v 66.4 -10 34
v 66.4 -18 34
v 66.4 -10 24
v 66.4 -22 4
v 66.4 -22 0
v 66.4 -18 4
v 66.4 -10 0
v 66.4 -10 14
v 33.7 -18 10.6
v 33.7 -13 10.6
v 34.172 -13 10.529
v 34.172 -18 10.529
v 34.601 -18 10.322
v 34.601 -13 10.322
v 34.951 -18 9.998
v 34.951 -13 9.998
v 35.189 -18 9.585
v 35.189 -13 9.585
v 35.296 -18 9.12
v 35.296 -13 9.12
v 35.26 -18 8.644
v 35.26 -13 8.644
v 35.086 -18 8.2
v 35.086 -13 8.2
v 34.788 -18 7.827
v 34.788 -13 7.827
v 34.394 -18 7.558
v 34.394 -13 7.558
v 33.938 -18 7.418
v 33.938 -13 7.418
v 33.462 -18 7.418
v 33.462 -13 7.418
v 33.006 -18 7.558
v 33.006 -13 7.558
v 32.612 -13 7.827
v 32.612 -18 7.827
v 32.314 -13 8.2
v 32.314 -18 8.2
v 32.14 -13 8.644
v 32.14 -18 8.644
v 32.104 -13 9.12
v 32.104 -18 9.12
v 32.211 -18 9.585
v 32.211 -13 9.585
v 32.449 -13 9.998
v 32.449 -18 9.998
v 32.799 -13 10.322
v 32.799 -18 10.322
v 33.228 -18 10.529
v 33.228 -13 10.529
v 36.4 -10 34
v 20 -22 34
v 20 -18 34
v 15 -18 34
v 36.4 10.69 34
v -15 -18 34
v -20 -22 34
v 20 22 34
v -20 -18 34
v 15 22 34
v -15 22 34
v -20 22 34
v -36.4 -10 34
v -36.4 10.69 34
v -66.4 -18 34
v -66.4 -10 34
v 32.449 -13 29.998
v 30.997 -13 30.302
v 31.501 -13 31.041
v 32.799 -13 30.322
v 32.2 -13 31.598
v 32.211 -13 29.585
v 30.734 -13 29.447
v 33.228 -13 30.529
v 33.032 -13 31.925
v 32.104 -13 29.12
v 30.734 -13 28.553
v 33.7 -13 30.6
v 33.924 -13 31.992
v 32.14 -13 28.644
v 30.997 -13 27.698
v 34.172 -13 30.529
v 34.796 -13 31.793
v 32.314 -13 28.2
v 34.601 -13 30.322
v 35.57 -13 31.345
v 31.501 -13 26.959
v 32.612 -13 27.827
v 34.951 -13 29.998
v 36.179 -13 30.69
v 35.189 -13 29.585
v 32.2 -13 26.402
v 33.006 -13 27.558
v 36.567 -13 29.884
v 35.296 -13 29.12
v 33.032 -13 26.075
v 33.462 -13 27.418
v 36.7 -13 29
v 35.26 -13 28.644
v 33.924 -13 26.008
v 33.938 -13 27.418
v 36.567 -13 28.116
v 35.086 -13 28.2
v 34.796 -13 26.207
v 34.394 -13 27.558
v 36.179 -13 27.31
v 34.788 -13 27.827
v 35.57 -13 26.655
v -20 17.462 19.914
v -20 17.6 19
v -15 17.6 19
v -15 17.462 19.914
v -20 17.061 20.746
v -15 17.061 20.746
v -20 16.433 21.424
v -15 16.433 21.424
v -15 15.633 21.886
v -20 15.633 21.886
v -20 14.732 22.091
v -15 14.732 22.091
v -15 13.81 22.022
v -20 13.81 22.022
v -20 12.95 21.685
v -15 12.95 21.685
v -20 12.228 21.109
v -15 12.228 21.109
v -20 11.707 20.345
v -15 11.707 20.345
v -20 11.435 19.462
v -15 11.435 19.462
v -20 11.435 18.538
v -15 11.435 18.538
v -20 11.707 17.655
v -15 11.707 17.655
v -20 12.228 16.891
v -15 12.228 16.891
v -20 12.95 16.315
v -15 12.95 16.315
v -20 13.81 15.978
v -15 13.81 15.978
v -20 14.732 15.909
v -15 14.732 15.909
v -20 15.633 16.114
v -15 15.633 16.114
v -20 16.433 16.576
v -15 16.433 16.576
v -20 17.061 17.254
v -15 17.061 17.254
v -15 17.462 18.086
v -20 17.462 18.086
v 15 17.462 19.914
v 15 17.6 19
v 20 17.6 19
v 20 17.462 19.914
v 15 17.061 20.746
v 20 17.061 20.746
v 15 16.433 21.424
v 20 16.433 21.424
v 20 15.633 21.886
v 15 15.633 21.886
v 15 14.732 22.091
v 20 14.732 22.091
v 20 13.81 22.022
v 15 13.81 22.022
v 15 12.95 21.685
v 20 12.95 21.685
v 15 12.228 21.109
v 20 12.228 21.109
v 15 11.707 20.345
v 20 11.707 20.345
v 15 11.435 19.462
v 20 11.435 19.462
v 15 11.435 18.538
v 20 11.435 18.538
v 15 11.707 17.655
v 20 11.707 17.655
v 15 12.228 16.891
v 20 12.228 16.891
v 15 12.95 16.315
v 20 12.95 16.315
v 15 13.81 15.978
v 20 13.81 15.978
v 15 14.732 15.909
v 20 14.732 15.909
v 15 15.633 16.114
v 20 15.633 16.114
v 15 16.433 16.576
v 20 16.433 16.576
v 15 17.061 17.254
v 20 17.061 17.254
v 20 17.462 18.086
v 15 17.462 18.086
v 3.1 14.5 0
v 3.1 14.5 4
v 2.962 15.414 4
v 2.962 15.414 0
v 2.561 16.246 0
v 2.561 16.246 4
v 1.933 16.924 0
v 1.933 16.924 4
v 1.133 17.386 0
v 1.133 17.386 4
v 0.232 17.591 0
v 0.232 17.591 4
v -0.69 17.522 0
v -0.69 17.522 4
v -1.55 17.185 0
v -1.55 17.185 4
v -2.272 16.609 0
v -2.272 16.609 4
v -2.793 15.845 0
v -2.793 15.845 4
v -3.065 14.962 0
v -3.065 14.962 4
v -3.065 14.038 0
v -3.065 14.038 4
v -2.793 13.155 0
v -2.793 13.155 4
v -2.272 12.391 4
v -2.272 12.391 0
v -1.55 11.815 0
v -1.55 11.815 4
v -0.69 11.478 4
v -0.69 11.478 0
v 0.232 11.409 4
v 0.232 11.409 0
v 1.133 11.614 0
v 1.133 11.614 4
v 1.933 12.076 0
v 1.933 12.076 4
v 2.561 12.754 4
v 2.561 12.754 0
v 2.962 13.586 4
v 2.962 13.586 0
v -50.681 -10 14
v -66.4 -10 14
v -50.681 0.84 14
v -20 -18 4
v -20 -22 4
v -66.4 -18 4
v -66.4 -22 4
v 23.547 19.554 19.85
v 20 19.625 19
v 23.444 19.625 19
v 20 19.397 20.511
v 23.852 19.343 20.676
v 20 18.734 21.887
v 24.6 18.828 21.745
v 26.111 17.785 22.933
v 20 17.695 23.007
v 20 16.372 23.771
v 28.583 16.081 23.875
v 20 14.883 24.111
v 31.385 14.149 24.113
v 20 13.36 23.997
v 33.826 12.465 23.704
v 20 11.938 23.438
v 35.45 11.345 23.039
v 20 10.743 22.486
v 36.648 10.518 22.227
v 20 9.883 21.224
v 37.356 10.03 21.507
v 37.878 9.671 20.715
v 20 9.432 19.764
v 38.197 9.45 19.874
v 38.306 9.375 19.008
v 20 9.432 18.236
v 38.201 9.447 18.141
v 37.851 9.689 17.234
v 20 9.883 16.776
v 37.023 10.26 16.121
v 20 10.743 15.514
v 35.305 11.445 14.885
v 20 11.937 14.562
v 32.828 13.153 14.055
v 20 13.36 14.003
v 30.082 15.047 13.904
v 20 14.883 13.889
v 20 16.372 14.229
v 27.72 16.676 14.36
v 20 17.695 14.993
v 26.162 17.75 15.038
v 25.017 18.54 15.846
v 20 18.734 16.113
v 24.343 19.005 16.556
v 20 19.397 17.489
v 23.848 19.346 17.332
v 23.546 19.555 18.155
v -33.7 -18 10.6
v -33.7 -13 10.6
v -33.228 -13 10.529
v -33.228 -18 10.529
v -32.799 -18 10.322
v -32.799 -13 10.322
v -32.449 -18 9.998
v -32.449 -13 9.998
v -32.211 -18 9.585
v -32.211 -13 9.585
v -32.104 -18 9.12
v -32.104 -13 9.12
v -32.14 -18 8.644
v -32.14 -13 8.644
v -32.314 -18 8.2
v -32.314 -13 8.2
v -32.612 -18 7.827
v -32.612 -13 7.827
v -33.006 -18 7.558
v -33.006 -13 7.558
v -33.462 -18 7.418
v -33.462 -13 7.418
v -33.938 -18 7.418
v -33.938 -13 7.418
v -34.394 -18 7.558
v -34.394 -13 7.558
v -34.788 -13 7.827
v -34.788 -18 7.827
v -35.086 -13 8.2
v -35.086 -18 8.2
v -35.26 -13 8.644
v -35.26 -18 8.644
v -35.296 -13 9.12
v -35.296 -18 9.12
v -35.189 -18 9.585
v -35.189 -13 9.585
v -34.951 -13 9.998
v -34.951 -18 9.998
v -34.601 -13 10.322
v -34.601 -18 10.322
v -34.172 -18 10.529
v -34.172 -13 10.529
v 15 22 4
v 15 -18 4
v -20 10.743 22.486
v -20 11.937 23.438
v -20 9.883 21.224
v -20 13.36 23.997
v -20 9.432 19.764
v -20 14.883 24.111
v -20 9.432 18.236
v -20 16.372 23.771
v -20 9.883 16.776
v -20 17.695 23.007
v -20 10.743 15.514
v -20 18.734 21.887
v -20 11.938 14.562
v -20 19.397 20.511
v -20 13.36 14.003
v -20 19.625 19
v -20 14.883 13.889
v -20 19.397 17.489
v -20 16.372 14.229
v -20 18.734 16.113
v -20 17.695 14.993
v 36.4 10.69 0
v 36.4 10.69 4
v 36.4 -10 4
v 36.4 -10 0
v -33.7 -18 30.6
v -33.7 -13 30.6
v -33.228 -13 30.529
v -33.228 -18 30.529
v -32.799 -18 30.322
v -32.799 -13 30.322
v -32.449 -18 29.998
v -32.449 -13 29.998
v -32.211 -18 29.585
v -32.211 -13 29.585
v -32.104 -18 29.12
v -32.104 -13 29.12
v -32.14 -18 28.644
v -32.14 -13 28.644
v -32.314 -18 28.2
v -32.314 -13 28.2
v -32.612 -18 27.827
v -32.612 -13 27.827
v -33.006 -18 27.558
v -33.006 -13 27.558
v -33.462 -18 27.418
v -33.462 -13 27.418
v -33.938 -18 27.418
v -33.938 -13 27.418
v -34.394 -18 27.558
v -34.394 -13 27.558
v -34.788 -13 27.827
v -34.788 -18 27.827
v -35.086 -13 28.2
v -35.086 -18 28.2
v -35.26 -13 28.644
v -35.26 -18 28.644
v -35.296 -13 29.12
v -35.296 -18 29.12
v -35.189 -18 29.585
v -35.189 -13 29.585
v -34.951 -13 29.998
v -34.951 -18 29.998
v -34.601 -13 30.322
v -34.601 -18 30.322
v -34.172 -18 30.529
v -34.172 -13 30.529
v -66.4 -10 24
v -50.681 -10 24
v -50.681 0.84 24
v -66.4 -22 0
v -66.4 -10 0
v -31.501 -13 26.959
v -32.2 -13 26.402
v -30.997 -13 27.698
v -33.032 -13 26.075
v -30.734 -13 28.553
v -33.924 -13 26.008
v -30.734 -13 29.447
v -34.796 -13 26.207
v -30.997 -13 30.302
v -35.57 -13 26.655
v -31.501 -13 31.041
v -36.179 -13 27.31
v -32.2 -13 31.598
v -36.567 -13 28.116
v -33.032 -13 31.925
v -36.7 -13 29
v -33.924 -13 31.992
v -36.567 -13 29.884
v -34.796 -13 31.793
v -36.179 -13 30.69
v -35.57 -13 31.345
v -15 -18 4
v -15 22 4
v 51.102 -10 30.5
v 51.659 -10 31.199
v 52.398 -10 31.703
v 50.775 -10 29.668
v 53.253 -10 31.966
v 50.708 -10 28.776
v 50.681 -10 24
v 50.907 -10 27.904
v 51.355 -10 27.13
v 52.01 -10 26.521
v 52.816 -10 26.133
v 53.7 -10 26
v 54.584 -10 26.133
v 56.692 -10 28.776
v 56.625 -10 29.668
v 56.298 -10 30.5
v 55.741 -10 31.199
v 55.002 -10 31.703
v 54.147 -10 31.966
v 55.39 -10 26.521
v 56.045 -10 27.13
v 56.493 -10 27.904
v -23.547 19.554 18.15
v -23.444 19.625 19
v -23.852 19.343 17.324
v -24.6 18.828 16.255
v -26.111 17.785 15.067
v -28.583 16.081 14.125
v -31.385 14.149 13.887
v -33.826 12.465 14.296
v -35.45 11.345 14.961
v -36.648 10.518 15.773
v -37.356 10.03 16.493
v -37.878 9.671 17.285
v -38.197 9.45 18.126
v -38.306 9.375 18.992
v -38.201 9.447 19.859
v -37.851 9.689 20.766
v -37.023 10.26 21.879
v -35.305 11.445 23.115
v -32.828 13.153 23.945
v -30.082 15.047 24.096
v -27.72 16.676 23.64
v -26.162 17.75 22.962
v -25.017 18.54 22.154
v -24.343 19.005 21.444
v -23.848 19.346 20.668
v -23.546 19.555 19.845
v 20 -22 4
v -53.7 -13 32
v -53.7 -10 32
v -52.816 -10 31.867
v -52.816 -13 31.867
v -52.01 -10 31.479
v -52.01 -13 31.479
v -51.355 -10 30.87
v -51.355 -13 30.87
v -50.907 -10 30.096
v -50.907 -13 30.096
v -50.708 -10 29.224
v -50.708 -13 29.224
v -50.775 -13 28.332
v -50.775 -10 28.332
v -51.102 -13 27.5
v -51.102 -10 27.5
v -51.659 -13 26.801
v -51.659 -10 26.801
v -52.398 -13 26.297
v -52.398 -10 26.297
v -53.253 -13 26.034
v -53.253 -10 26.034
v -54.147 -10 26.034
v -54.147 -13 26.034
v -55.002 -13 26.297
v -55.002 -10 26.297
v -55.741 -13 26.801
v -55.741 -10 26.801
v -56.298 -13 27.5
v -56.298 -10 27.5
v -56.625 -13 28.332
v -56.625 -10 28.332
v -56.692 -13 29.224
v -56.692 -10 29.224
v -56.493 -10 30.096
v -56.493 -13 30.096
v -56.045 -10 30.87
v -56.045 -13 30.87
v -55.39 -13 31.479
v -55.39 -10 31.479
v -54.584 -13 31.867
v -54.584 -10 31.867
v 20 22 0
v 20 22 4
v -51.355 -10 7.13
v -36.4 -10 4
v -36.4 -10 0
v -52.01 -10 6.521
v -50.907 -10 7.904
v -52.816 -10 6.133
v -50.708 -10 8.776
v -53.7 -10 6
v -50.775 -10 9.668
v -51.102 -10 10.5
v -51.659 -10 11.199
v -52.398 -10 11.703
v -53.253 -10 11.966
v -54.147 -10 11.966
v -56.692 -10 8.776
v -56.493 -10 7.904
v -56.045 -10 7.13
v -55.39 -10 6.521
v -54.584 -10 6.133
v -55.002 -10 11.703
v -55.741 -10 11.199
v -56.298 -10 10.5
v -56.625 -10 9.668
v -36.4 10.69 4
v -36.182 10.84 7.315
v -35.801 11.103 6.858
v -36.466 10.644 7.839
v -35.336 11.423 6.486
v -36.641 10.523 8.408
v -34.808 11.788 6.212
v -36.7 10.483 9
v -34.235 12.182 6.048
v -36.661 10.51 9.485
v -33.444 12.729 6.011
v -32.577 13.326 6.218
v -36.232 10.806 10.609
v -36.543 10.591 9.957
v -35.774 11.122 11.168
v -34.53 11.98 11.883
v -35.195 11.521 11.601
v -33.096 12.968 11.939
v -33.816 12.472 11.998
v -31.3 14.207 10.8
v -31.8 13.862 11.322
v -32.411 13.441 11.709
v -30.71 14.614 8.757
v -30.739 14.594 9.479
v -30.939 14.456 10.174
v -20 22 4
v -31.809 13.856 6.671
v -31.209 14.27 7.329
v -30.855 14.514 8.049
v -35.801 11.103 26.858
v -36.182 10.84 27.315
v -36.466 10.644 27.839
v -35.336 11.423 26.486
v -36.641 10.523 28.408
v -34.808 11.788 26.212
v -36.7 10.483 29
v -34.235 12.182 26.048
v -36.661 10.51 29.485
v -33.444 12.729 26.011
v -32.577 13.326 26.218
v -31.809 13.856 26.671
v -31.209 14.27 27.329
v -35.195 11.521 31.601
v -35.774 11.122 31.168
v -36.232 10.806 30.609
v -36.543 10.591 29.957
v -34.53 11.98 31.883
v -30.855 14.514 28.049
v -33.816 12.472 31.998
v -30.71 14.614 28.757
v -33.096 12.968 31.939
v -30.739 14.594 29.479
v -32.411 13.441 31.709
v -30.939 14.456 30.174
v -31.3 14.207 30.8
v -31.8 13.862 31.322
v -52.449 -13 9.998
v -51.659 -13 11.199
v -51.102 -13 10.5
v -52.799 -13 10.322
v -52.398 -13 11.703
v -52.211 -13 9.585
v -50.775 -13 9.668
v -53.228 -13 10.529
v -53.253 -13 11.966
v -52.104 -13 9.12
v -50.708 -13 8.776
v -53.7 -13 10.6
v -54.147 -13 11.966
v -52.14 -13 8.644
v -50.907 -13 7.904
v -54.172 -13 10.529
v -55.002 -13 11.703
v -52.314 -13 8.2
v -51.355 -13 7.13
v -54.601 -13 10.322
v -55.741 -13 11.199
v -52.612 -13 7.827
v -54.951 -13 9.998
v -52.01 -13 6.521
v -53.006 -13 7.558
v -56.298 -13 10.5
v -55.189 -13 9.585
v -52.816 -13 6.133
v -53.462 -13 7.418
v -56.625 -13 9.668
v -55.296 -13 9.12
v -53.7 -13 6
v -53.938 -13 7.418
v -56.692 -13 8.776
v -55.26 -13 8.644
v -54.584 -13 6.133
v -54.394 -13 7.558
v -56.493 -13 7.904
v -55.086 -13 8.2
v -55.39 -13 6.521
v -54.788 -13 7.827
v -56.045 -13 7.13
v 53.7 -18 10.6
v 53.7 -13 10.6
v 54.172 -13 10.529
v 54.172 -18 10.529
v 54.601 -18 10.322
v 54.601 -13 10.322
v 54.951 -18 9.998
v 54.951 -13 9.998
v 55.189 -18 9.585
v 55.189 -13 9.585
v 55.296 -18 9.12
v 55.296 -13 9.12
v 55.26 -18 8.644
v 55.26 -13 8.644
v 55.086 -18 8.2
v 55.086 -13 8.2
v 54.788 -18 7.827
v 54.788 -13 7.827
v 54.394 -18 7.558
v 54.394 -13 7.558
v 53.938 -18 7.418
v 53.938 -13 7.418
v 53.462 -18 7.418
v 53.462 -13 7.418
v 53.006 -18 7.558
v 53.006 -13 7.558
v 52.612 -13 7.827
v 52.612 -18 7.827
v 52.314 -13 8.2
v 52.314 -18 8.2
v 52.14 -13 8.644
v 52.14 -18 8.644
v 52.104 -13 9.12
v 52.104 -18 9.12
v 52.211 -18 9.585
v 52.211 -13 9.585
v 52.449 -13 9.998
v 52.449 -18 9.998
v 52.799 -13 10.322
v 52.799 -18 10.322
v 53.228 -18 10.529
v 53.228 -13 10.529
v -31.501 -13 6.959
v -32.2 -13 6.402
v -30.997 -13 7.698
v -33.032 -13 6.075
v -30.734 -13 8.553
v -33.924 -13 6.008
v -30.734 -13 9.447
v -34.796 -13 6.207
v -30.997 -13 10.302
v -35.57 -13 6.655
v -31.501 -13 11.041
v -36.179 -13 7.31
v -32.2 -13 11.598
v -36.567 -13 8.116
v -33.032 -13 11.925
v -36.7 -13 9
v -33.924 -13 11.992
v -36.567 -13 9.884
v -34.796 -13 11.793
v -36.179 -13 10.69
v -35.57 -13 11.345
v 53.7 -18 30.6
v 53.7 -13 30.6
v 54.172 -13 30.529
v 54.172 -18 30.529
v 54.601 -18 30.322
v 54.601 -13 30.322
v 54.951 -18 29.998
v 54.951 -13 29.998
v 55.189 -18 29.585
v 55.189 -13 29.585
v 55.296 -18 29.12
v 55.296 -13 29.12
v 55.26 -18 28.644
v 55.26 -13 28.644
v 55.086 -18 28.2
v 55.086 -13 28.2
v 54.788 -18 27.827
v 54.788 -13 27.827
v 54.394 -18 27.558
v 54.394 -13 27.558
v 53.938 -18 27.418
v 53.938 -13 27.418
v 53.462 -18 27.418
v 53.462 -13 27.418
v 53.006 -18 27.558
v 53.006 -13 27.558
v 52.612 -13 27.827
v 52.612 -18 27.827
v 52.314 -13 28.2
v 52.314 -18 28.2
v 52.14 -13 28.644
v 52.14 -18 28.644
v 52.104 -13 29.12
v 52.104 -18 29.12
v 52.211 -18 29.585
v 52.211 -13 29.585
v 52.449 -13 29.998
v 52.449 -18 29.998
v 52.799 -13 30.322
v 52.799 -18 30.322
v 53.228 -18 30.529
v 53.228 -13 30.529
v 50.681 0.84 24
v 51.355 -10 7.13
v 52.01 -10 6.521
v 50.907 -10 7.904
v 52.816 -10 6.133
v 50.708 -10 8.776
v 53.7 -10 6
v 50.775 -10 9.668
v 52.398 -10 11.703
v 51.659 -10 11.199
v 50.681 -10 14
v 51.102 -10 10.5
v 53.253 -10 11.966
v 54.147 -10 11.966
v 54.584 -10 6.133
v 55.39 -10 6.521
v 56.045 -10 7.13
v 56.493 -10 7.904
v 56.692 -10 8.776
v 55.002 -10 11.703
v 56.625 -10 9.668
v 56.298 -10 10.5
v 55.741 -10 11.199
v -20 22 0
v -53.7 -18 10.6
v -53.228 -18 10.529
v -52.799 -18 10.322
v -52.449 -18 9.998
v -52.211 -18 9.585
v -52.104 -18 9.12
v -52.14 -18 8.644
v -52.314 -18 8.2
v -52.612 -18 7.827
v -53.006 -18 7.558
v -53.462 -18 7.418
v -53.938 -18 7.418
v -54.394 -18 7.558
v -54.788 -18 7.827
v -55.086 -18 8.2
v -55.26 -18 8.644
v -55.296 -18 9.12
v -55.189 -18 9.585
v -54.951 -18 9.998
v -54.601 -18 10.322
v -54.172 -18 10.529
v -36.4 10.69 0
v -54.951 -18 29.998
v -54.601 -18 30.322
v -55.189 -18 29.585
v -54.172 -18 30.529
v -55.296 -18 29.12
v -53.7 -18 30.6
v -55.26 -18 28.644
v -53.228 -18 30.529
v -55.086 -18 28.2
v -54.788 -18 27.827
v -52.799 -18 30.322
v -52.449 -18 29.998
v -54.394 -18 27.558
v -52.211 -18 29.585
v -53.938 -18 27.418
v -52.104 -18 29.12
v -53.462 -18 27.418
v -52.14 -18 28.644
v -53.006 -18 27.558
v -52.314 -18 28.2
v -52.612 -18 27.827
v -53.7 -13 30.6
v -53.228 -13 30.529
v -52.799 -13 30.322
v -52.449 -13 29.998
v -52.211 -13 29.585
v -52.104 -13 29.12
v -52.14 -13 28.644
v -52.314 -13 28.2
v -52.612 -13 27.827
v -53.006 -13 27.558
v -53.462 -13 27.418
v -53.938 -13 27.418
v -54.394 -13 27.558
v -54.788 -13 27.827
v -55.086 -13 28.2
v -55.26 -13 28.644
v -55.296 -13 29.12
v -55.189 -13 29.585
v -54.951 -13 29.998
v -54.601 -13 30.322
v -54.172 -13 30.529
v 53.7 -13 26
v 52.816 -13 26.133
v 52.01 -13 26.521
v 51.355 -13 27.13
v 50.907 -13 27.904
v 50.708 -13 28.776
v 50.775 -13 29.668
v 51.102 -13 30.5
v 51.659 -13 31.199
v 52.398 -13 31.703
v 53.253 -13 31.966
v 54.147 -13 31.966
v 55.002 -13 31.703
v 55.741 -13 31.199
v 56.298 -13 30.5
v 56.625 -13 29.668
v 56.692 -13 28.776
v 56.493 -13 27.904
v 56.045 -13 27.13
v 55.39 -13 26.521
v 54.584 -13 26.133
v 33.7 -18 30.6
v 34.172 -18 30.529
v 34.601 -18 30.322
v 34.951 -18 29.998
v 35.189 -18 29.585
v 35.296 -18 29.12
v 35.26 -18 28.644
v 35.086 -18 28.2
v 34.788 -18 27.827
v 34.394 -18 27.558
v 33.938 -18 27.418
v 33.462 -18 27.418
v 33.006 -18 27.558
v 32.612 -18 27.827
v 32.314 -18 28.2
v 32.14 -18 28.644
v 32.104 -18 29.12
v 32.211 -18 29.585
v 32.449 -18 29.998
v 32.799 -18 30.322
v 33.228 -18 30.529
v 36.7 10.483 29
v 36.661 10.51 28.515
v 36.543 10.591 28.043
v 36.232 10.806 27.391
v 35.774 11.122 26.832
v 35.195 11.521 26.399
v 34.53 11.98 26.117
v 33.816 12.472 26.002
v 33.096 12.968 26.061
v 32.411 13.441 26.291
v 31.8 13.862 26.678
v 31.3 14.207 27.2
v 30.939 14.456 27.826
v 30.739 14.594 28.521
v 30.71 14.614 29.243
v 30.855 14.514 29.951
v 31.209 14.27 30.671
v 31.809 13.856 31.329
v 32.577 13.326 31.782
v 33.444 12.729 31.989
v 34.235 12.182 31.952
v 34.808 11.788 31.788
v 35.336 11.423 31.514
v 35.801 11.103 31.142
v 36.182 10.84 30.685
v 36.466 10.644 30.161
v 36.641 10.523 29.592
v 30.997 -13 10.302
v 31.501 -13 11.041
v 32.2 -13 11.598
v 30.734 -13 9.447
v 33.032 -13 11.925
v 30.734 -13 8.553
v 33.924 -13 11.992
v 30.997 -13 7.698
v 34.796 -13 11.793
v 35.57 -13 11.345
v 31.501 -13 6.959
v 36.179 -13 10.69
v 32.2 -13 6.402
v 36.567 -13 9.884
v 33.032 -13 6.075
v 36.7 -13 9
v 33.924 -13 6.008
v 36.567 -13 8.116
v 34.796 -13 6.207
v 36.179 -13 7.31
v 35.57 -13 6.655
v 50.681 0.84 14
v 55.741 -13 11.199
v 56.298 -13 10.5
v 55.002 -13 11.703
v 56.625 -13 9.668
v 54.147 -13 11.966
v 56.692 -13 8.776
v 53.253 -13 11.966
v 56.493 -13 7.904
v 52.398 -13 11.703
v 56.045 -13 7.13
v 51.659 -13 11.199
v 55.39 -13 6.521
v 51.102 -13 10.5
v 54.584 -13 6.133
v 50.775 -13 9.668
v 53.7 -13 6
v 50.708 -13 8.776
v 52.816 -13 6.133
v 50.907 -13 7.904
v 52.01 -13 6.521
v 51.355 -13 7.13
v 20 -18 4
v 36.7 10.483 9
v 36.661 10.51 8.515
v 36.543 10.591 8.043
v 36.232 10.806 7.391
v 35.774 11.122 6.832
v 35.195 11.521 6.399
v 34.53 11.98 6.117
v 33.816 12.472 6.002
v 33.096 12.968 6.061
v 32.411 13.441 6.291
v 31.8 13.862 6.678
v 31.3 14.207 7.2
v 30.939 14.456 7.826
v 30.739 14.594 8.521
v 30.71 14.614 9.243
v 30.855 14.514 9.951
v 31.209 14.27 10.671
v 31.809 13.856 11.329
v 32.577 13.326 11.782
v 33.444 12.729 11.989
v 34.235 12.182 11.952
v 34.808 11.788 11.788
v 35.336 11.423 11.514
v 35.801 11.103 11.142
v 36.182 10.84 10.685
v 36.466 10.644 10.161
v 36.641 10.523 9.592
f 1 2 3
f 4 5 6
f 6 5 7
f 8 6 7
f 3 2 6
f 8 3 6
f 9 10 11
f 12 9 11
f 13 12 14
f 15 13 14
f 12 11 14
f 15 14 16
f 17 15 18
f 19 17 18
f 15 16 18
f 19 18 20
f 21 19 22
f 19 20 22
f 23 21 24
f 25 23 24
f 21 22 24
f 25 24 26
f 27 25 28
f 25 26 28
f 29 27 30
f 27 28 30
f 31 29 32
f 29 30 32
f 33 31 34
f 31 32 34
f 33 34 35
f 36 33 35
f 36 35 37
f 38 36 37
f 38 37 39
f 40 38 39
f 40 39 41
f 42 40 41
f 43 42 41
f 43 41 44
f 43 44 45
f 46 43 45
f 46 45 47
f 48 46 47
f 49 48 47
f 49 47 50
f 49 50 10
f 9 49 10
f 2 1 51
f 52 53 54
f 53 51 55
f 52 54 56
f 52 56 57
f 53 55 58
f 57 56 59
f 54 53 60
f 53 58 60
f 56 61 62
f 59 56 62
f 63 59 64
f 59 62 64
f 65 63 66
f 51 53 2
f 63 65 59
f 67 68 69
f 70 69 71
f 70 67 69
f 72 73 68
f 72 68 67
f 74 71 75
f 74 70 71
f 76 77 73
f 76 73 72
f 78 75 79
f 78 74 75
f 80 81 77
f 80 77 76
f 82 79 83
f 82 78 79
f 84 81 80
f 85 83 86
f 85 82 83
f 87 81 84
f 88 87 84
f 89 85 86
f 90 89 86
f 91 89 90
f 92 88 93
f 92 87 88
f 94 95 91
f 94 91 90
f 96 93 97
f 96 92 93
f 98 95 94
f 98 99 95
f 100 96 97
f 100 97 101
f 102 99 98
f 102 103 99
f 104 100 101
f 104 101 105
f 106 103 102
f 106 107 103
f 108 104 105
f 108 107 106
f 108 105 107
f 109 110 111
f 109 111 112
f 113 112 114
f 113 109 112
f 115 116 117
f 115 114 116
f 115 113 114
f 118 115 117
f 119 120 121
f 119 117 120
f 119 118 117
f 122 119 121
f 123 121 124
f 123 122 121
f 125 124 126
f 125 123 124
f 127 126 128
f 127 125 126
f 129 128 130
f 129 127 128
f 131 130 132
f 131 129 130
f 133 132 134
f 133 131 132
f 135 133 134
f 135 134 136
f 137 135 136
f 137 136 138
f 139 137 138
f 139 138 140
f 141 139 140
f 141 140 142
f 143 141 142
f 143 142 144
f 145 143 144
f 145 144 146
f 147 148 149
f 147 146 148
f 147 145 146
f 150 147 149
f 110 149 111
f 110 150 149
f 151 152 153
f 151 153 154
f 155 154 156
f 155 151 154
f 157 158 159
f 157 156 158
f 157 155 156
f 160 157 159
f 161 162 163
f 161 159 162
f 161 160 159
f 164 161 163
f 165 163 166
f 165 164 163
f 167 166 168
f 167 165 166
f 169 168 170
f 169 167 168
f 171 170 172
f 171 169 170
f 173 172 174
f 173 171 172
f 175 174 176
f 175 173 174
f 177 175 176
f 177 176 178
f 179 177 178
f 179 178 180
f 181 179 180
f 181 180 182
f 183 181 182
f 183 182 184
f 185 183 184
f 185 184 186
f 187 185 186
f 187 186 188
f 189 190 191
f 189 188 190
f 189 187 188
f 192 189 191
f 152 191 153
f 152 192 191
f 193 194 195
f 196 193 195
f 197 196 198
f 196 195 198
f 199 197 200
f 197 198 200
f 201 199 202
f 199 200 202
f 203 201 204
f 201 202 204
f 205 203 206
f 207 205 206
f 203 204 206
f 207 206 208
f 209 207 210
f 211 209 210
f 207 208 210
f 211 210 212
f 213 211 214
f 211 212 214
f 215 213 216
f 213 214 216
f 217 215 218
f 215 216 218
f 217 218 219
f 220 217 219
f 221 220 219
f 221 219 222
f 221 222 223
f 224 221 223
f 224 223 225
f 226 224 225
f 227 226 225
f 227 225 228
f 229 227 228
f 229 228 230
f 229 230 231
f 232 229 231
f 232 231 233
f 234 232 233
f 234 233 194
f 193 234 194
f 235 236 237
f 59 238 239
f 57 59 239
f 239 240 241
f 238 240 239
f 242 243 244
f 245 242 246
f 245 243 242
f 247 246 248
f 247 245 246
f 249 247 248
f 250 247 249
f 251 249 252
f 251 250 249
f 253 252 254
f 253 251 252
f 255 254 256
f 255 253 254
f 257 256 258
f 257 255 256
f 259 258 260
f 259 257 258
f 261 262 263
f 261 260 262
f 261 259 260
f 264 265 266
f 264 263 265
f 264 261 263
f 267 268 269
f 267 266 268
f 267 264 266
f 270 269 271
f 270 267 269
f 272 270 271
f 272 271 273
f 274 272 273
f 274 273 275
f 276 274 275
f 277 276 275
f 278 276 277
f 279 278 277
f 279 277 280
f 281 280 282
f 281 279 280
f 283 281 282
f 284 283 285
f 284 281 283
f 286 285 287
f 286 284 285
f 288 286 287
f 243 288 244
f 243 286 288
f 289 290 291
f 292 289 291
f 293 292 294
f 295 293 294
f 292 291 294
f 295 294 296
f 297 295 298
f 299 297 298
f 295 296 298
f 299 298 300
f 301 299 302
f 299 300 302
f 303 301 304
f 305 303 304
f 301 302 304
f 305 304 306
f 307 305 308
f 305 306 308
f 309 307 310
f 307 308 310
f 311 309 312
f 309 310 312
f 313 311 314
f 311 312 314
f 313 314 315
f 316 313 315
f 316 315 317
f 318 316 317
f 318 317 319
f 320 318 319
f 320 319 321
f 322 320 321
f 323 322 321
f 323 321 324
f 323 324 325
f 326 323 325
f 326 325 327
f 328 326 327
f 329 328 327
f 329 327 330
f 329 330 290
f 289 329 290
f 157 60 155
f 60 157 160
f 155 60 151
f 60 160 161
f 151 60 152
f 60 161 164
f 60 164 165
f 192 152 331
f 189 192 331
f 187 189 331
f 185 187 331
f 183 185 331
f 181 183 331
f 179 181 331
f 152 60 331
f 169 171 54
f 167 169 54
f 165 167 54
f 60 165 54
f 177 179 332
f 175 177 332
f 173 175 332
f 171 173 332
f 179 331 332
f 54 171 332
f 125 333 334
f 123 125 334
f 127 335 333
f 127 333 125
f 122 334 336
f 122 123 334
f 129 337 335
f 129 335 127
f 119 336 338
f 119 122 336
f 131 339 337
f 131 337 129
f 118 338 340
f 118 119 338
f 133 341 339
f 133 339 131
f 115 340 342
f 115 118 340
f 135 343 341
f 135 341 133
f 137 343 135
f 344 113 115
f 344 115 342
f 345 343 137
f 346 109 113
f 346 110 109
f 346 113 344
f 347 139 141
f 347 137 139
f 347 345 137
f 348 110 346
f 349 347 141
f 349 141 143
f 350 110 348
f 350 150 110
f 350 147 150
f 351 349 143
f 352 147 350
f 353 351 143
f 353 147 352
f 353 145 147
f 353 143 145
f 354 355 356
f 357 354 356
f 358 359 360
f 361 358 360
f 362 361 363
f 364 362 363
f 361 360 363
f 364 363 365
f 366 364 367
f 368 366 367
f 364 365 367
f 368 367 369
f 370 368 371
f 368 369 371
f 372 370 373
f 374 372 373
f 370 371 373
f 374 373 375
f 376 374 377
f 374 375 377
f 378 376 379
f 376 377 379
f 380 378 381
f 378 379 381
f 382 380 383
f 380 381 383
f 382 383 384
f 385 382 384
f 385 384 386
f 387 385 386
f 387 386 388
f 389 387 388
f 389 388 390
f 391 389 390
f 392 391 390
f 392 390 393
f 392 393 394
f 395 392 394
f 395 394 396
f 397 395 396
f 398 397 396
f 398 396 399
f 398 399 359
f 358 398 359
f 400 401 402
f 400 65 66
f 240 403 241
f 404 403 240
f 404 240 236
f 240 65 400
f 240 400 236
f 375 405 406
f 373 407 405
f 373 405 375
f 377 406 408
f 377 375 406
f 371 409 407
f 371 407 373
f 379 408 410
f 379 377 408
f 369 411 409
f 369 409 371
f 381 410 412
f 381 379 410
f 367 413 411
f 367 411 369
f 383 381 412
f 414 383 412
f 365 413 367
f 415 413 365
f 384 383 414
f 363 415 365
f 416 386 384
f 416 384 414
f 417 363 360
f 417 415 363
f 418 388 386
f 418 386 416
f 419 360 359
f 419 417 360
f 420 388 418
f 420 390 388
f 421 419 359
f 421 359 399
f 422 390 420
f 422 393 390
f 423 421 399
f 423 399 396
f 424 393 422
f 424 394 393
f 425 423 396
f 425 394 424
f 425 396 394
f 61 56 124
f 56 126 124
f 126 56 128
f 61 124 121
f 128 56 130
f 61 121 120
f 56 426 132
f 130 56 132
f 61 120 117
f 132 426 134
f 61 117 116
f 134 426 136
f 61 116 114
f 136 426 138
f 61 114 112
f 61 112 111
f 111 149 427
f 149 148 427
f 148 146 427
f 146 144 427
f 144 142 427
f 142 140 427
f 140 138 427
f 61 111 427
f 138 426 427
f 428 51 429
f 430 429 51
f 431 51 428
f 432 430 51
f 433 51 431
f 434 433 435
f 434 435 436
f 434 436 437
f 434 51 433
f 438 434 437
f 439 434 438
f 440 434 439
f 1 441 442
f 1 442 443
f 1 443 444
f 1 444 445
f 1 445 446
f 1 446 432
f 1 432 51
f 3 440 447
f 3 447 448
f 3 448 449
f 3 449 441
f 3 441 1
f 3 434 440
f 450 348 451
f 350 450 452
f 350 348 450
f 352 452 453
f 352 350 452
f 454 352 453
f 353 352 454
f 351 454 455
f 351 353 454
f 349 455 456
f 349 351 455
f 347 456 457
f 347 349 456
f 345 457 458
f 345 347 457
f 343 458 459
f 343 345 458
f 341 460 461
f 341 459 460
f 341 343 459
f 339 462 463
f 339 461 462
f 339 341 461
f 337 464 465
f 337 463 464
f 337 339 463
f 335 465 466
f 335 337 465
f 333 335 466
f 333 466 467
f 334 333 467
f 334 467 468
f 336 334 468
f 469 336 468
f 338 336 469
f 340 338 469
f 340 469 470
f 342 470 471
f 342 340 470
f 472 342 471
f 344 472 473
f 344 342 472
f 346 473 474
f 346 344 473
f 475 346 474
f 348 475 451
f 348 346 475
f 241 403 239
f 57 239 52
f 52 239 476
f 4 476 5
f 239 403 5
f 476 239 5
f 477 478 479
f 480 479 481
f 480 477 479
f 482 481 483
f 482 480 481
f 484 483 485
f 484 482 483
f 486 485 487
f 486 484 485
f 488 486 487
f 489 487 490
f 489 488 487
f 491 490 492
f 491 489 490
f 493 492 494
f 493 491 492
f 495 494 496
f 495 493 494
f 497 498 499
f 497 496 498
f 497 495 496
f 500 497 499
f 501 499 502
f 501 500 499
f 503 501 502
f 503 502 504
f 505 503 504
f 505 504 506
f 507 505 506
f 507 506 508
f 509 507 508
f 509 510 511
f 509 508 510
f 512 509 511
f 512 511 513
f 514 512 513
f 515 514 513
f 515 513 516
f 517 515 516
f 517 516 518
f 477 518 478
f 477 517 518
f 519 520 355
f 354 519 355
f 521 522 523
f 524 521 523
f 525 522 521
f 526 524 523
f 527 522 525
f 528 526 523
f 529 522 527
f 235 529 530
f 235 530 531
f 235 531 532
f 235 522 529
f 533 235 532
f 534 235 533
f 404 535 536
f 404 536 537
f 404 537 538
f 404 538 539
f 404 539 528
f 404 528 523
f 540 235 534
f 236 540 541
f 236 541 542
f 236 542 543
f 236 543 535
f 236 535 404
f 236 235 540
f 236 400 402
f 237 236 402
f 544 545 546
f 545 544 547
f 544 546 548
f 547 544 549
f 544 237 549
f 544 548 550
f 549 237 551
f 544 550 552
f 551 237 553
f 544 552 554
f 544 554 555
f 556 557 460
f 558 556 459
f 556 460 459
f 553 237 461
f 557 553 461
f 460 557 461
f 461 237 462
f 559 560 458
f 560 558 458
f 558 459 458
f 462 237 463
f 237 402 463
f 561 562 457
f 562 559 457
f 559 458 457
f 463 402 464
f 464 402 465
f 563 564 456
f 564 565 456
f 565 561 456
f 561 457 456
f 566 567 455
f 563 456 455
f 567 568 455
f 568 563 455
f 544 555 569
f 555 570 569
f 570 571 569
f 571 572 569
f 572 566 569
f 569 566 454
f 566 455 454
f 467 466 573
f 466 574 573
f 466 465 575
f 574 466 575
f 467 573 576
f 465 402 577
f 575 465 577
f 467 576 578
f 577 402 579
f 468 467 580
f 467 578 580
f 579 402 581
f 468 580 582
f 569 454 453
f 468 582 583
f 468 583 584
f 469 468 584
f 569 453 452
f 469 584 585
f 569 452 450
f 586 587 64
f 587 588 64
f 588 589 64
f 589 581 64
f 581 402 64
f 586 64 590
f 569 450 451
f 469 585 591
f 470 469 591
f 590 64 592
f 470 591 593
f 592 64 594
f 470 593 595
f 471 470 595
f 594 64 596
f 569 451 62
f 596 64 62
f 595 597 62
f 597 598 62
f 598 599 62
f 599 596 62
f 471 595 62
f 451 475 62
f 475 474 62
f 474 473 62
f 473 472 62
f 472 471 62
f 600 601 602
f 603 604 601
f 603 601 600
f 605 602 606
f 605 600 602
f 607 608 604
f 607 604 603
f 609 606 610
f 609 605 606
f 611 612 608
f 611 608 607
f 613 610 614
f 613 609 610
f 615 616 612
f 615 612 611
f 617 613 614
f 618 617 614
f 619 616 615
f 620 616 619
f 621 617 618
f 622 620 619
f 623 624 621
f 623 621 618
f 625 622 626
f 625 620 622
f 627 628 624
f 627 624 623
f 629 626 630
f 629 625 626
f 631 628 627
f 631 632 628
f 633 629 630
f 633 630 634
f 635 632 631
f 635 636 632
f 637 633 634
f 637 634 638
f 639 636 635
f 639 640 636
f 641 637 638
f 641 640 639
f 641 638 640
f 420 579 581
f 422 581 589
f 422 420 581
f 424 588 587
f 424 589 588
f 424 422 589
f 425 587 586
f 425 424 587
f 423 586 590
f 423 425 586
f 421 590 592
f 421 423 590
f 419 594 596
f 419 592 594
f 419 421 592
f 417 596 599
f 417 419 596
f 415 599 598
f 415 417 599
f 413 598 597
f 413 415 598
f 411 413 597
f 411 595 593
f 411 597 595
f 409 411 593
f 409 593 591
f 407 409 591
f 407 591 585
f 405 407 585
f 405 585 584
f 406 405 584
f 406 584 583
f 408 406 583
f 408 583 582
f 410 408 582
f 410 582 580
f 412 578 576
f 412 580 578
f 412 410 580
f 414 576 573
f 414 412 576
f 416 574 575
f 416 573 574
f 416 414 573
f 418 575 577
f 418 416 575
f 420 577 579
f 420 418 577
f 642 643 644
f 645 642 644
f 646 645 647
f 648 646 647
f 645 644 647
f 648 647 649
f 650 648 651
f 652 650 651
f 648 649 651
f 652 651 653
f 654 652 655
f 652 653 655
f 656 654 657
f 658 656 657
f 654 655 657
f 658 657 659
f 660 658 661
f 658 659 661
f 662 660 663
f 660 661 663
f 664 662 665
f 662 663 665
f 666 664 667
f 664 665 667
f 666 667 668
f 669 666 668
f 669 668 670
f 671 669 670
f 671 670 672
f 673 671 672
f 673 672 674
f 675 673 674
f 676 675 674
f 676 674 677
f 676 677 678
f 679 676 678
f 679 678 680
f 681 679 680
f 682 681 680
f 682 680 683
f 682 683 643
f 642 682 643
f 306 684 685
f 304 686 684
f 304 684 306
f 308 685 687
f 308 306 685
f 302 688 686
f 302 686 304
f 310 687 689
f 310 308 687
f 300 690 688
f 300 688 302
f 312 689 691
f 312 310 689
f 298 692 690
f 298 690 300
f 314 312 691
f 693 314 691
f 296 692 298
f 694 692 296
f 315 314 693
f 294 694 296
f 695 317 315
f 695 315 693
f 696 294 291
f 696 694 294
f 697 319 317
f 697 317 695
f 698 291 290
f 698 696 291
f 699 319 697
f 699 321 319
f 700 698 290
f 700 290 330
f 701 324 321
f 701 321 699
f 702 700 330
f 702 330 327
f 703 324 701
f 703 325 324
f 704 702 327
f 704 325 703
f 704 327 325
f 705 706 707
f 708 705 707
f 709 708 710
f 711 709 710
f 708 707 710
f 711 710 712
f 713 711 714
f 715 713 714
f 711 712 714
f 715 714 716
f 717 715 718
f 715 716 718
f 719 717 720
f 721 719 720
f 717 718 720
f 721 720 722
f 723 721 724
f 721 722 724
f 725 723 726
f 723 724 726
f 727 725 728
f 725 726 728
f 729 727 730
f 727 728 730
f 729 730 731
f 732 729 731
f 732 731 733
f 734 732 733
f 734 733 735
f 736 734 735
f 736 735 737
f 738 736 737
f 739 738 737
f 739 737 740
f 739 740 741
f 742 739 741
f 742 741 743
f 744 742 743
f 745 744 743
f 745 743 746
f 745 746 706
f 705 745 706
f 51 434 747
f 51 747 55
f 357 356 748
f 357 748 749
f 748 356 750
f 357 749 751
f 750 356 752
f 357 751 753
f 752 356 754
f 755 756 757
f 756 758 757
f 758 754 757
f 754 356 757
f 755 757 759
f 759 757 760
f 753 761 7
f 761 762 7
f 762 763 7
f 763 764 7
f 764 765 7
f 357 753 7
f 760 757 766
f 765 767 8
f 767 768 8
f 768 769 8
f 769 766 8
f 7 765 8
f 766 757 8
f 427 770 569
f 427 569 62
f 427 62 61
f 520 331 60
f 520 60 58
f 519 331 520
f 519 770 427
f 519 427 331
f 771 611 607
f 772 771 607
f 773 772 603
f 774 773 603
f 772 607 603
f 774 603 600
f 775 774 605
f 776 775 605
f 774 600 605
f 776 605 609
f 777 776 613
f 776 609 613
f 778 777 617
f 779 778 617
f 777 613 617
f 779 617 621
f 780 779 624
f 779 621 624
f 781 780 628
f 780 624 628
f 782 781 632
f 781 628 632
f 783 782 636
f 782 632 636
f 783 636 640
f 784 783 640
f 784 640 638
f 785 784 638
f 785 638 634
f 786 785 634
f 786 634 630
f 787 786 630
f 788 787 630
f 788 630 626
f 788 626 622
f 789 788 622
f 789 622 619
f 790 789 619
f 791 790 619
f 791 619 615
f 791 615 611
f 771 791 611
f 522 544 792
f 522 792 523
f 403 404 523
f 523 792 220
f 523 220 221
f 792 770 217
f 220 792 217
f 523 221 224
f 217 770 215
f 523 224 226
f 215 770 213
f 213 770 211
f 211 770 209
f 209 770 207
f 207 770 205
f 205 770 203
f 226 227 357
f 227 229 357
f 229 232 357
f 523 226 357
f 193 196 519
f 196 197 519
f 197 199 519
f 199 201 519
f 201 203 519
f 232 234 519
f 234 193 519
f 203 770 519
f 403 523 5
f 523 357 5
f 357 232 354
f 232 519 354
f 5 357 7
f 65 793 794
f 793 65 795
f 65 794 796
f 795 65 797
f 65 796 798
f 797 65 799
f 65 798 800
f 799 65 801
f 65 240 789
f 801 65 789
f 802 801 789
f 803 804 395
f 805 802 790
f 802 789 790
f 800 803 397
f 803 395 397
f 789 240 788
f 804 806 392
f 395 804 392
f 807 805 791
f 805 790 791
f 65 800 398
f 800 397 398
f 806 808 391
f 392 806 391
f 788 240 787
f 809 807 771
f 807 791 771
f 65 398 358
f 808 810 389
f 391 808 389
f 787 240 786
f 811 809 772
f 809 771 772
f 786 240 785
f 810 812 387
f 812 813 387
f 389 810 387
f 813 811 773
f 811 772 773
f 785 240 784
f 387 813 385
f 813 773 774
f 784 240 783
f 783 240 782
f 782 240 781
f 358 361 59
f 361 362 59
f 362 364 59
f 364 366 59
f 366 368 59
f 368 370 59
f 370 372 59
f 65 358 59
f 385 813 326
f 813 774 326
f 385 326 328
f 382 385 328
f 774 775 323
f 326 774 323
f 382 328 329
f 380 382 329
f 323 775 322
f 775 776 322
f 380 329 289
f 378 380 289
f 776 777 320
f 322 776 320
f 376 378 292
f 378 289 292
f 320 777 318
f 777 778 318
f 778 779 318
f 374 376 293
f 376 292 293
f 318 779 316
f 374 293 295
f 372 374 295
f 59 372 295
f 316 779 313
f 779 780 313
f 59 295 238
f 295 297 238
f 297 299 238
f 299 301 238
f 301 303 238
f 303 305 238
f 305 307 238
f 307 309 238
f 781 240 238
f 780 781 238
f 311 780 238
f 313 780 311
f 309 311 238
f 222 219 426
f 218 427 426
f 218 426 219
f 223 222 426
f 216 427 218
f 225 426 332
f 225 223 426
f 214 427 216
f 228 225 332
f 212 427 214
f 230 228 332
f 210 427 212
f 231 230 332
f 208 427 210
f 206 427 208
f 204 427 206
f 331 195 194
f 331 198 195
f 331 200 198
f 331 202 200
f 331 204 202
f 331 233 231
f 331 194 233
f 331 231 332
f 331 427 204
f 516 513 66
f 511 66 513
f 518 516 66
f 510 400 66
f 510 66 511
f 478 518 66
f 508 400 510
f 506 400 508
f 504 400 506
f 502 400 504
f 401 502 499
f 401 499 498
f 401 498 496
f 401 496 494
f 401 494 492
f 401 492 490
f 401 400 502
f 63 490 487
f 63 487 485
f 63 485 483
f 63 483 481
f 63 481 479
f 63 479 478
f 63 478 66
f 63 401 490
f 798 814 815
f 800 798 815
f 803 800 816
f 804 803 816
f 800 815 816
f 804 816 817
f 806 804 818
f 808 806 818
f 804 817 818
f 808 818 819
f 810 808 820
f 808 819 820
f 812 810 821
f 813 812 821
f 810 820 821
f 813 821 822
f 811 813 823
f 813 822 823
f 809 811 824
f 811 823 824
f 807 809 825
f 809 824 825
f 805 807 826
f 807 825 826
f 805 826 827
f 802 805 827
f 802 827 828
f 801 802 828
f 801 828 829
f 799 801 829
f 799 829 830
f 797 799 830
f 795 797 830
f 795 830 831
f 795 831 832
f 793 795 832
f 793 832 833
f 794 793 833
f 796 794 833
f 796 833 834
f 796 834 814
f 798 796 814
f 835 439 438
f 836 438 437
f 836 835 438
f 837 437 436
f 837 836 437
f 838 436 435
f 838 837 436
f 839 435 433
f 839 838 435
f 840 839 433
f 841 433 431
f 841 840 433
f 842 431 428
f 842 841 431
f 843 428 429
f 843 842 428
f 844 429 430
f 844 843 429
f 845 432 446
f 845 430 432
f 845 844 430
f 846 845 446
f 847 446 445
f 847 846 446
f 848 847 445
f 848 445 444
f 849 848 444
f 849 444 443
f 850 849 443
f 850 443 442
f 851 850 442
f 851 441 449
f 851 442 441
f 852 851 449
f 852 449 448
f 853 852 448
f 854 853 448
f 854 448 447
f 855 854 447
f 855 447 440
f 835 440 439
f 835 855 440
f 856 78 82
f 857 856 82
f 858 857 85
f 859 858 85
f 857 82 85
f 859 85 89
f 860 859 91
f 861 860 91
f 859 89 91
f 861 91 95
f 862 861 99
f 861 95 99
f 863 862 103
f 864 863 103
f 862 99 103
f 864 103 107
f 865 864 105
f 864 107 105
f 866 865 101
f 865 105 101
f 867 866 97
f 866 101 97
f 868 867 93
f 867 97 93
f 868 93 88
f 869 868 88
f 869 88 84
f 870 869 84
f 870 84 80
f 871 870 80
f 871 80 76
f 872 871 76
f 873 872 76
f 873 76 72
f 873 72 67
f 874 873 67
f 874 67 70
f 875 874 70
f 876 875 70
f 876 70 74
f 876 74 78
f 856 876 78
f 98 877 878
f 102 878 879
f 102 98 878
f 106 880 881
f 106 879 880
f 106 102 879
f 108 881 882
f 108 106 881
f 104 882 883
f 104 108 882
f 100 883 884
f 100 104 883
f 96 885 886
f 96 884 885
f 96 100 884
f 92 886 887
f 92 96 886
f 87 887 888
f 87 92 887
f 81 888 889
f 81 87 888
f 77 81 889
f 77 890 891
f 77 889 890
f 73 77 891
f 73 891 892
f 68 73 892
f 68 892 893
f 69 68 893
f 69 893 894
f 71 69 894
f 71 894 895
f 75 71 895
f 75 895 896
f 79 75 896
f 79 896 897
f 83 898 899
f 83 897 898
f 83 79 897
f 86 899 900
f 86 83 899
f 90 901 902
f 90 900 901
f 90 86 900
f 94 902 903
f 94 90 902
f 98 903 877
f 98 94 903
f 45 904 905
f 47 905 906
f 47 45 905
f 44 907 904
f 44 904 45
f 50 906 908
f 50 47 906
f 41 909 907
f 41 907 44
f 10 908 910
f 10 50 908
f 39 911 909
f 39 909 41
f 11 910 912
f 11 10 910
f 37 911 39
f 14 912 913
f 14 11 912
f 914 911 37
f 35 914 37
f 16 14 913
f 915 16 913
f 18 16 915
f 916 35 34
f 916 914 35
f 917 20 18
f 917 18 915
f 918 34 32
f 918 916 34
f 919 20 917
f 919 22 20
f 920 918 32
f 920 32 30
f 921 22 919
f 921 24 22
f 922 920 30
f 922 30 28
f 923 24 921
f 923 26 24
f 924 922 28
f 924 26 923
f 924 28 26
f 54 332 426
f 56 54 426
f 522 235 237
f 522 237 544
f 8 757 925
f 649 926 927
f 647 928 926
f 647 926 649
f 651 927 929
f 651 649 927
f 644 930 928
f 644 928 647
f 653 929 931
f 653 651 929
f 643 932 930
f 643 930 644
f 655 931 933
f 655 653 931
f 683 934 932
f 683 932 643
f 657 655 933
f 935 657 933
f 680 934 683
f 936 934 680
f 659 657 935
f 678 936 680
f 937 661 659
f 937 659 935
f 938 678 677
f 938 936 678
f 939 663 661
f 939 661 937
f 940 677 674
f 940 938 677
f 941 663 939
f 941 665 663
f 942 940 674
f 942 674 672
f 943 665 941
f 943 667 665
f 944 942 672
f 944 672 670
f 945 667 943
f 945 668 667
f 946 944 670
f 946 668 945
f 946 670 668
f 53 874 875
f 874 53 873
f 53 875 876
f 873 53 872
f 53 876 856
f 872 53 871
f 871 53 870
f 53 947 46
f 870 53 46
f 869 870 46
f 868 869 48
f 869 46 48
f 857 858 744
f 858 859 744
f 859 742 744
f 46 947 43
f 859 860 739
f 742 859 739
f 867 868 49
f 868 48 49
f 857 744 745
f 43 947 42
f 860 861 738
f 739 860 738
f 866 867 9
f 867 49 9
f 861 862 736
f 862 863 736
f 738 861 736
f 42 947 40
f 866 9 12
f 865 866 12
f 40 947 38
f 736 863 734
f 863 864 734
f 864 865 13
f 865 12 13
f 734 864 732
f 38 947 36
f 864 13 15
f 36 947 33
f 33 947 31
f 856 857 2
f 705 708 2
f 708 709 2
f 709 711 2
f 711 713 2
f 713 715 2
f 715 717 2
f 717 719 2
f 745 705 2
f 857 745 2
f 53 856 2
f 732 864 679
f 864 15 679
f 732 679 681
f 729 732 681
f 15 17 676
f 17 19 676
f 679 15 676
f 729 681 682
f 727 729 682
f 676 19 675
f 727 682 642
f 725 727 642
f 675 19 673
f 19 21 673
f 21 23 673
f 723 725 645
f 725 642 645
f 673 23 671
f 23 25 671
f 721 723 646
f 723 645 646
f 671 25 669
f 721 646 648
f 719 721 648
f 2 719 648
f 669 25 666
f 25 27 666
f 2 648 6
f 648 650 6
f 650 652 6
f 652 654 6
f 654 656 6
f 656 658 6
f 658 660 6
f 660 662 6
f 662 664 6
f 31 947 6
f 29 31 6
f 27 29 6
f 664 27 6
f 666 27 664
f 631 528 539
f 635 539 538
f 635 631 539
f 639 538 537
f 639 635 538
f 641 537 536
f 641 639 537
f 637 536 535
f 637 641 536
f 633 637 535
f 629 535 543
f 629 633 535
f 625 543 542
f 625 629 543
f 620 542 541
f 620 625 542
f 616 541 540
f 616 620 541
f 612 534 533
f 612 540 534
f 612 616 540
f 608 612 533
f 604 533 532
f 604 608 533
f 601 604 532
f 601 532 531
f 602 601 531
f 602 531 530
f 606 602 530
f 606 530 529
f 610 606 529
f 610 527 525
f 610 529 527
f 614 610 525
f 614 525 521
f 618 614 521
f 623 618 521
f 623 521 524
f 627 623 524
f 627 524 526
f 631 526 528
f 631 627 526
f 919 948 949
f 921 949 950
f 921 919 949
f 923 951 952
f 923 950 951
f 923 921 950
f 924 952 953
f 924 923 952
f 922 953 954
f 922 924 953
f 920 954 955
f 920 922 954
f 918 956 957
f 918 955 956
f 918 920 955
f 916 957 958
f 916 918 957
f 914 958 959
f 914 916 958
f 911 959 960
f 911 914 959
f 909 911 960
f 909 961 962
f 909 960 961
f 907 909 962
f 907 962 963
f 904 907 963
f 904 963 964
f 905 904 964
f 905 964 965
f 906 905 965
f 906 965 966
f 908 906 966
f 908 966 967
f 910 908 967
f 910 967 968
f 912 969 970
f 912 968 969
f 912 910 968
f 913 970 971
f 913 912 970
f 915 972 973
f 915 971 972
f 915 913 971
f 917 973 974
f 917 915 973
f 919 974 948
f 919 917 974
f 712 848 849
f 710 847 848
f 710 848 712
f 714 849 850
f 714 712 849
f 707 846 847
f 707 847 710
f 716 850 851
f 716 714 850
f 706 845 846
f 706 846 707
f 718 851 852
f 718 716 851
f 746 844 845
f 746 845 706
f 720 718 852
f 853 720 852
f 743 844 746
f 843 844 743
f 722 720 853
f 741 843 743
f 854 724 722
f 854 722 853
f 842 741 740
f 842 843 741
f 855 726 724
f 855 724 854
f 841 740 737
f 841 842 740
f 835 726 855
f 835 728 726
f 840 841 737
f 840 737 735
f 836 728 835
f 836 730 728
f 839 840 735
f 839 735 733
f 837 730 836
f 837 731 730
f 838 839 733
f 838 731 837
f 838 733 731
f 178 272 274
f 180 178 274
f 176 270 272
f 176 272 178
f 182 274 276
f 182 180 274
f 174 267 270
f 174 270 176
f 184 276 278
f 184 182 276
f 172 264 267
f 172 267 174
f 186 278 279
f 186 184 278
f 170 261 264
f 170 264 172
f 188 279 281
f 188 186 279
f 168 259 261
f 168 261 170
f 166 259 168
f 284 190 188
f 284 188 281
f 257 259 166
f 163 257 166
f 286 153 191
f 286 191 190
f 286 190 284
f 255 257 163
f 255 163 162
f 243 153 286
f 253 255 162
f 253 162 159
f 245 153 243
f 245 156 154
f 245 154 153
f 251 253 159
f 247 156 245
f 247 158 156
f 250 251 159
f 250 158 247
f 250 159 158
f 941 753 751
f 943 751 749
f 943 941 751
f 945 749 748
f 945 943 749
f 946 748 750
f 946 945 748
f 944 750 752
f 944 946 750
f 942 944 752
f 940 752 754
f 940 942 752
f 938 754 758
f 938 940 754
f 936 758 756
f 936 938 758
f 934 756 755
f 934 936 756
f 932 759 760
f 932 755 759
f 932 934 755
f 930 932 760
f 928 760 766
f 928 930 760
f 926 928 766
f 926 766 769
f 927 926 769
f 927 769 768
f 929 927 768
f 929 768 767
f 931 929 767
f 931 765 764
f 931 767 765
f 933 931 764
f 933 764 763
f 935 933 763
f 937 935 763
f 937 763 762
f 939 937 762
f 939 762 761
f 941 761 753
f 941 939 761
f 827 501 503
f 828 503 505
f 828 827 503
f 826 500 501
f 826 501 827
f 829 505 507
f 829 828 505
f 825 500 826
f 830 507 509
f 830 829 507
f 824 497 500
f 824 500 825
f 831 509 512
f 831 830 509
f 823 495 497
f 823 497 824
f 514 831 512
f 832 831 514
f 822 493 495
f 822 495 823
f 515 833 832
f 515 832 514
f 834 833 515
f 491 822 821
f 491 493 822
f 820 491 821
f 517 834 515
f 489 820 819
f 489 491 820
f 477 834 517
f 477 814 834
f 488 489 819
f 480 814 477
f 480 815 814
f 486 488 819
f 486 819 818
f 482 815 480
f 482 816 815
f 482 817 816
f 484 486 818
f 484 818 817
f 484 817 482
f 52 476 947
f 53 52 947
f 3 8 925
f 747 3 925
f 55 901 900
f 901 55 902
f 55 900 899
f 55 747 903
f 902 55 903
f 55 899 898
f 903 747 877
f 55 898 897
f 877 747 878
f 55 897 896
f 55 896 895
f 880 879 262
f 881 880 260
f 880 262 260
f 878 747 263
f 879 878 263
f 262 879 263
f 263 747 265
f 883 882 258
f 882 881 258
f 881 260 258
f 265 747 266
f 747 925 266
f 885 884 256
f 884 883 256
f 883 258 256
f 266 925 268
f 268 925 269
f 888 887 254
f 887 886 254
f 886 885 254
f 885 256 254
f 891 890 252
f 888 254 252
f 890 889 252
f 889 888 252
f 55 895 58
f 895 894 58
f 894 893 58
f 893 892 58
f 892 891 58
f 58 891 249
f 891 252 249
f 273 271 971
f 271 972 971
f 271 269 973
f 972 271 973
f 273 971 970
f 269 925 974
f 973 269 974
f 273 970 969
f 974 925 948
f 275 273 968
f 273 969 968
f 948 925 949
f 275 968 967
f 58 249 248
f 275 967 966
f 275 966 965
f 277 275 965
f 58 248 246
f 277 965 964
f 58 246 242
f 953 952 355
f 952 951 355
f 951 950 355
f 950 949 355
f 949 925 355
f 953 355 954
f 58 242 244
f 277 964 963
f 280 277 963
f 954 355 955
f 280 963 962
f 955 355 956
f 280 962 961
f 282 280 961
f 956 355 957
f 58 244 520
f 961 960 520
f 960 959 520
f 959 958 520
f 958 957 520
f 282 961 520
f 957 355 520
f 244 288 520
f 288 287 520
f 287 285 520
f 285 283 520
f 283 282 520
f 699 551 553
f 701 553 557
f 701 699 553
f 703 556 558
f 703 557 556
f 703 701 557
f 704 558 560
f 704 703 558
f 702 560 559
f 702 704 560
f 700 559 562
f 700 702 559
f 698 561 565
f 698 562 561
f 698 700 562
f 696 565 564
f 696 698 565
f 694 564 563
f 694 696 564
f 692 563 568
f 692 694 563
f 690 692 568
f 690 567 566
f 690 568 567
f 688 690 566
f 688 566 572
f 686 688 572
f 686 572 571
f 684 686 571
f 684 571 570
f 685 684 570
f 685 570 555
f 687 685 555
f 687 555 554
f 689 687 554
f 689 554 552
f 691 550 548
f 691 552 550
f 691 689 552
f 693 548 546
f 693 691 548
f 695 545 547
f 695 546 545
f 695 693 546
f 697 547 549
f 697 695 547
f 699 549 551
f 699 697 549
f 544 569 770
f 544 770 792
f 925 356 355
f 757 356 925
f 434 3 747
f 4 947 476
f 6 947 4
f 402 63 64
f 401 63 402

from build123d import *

# Parameters (mm, degrees)
SKETCH1_W               = 132.8
SKETCH1_H               = 44
BOSS_EXTRUDE1_DEPTH     = 4
BOSS_EXTRUDE2_DEPTH     = 30
BOSS_EXTRUDE3_DEPTH     = 15
CUT_EXTRUDE3_DEPTH      = 91.917325082
CUT_EXTRUDE3_DEPTH_BACK = 91.917325082
SKETCH6_R               = 3.1
SKETCH8_R               = 5.125
CUT_EXTRUDE5_DEPTH      = 96.419914064
SKETCH9_R               = 5.125
CUT_EXTRUDE6_DEPTH      = 96.419914064
CUT_EXTRUDE4_DEPTH      = 82.172409106
SKETCH3_R               = 1.6
CUT_EXTRUDE1_DEPTH      = 30
CUT_EXTRUDE2_DEPTH      = 82.172409106
CUT_EXTRUDE2_DEPTH_BACK = 3
SKETCH4_R               = 3
CUT_EXTRUDE7_DEPTH      = 77.11149716
SKETCH11_R              = 3.1
CUT_EXTRUDE8_DEPTH      = 77.11149716


with BuildPart() as part:
    # Sketch1 → Boss-Extrude1 (new body)
    with BuildSketch(Plane.XY):
        Rectangle(SKETCH1_W, SKETCH1_H)
    extrude(amount=BOSS_EXTRUDE1_DEPTH)

    # Sketch2 → Boss-Extrude2 (add)
    with BuildSketch(Plane.XY.offset(4)):
        Polygon((15, -18), (-15, -18), (-15, 22), (-20, 22), (-20, -10), (-66.4, -10), (-66.4, -18), (-20, -18), (-20, -22), (20, -22), (20, -18), (66.4, -18), (66.4, -10), (20, -10), (20, 22), (15, 22), align=None)
    extrude(amount=BOSS_EXTRUDE2_DEPTH)

    # Sketch5 → Boss-Extrude3 (add, symmetric)
    with BuildSketch(Plane.XY.offset(19)):
        Polygon((20, -10), (66.4, -10), (20, 22), align=None)
        Polygon((-20, 22), (-20, -10), (-66.4, -10), align=None)
    extrude(amount=BOSS_EXTRUDE3_DEPTH, both=True)

    # Sketch6 → Cut-Extrude3 (cut, two sides: drawn at the far end of the back side and taken through both)
    with BuildSketch(Plane(origin=(-15, 0, 0), x_dir=(0, 0, -1), z_dir=(1, 0, 0)).offset(-CUT_EXTRUDE3_DEPTH_BACK)):
        with Locations((-19, 14.5)):
            Circle(SKETCH6_R)
    extrude(amount=CUT_EXTRUDE3_DEPTH + CUT_EXTRUDE3_DEPTH_BACK, mode=Mode.SUBTRACT)

    # Sketch8 → Cut-Extrude5 (cut, through all)
    with BuildSketch(Plane(origin=(20, 0, 0), x_dir=(0, 0, -1), z_dir=(1, 0, 0))):
        with Locations((-19, 14.5)):
            Circle(SKETCH8_R)
    extrude(amount=CUT_EXTRUDE5_DEPTH, mode=Mode.SUBTRACT)

    # Sketch9 → Cut-Extrude6 (cut, through all)
    with BuildSketch(Plane.ZY.offset(20)):
        with Locations((19, 14.5)):
            Circle(SKETCH9_R)
    extrude(amount=CUT_EXTRUDE6_DEPTH, mode=Mode.SUBTRACT)

    # Sketch7 → Cut-Extrude4 (cut, through all)
    with BuildSketch(Plane(origin=(0, -10, 0), x_dir=(1, 0, 0), z_dir=(0, 1, 0))):
        Polygon((50.681480067, -14), (66.4, -14), (66.4, -4), (36.4, -4), align=None)
        Polygon((66.4, -34), (66.4, -24), (50.681480067, -24), (36.4, -34), align=None)
        Polygon((-66.4, -4), (-66.4, -14), (-50.681480067, -14), (-36.4, -4), align=None)
        Polygon((-50.681480067, -24), (-66.4, -24), (-66.4, -34), (-36.4, -34), align=None)
    extrude(amount=CUT_EXTRUDE4_DEPTH, mode=Mode.SUBTRACT)

    # Sketch3 → Cut-Extrude1 (cut)
    with BuildSketch(Plane(origin=(0, -10, 0), x_dir=(1, 0, 0), z_dir=(0, 1, 0))):
        with Locations((-53.7, -9)):
            Circle(SKETCH3_R)
        with Locations((-33.7, -29)):
            Circle(SKETCH3_R)
        with Locations((-33.7, -9)):
            Circle(SKETCH3_R)
        with Locations((-53.7, -29)):
            Circle(SKETCH3_R)
        with Locations((33.7, -9)):
            Circle(SKETCH3_R)
        with Locations((33.7, -29)):
            Circle(SKETCH3_R)
        with Locations((53.7, -29)):
            Circle(SKETCH3_R)
        with Locations((53.7, -9)):
            Circle(SKETCH3_R)
    extrude(amount=-CUT_EXTRUDE1_DEPTH, mode=Mode.SUBTRACT)

    # Sketch4 → Cut-Extrude2 (cut, two sides: drawn at the far end of the back side and taken through both)
    with BuildSketch(Plane(origin=(0, -10, 0), x_dir=(1, 0, 0), z_dir=(0, 1, 0)).offset(-CUT_EXTRUDE2_DEPTH_BACK)):
        with Locations((-53.7, -9)):
            Circle(SKETCH4_R)
        with Locations((-33.7, -9)):
            Circle(SKETCH4_R)
        with Locations((-33.7, -29)):
            Circle(SKETCH4_R)
        with Locations((-53.7, -29)):
            Circle(SKETCH4_R)
        with Locations((33.7, -9)):
            Circle(SKETCH4_R)
        with Locations((53.7, -9)):
            Circle(SKETCH4_R)
        with Locations((53.7, -29)):
            Circle(SKETCH4_R)
        with Locations((33.7, -29)):
            Circle(SKETCH4_R)
    extrude(amount=CUT_EXTRUDE2_DEPTH + CUT_EXTRUDE2_DEPTH_BACK, mode=Mode.SUBTRACT)

    # Sketch10 → Cut-Extrude7 (cut, through all)
    with BuildSketch(Plane.XY.offset(4)):
        Polygon((20, 22), (36.4, 10.689655172), (36.4, -10), (66.4, -10), (66.4, 22), align=None)
        Polygon((-66.4, 22), (-20, 22), (-36.4, 10.689655172), (-36.4, -10), (-66.4, -10), align=None)
    extrude(amount=-CUT_EXTRUDE7_DEPTH, mode=Mode.SUBTRACT)

    # Sketch11 → Cut-Extrude8 (cut, through all)
    with BuildSketch(Plane.XY.offset(4)):
        with Locations((0, 14.5)):
            Circle(SKETCH11_R)
    extrude(amount=-CUT_EXTRUDE8_DEPTH, mode=Mode.SUBTRACT)


solid = part.part
